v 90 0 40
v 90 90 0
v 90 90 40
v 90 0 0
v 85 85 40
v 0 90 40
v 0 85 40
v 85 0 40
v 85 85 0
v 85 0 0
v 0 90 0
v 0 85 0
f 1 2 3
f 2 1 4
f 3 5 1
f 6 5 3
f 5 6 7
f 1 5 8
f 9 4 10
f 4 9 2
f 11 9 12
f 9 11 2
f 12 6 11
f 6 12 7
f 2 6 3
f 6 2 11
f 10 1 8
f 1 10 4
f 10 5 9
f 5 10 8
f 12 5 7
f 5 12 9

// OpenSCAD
// DIY Magnetic Stirrer Housing
// Based on an 80mm PC case fan
// Print orientation: Upside down (Top plate on bed, walls rising up)
// Centred on Origin (X=0, Y=0)

// --- Dimensions ---
// Outer dimensions
W_OUT = 90;
H_OUT = 90;
// Thicknesses
T_TOP = 2;
T_WALL = 2.5;
// Height of walls (total height from bed to open top)
H_WALL = 40;
// Hole pattern for M4 screws
PATTERN_SIZE = 71.5;
D_HOLE = 4.5;
// Cable notch
NOTCH_W = 12;
NOTCH_H = 8; // Depth from open edge (z = 40 - 8 = 32)

// --- Configuration ---
$fn = 128; // High resolution for smooth curves and precise holes

// --- Construction ---
// We define the geometry in a local coordinate system where the bottom-left corner is (0,0).
// Then we translate the entire assembly to center it on the origin.

difference() {
    // 1. Main Solid Block
    // Dimensions: W_OUT x H_OUT x H_WALL
    cube([W_OUT, H_OUT, H_WALL], center = false);
    
    // 2. Internal Void
    // The empty space inside the box.
    // Width = 90 - 2*2.5 = 85
    // Height = 90 - 2*2.5 = 85
    // Depth = 40 (from z=0 to z=40)
    cube([W_OUT - 2*T_WALL, H_OUT - 2*T_WALL, H_WALL], center = false);
    
    // 3. Screw Holes
    // 4 holes on a 71.5mm square pattern centered on the plate.
    // In local coordinates, the plate is 90x90, centered at (45, 45).
    // Pattern center is (45, 45).
    // Offsets: +/- 71.5/2 = +/- 35.75
    // Z position: Through the top plate (z=0 to z=2).
    // Extend slightly past z=2 to ensure clean cut.
    for (i = [-1, 1]) {
        for (j = [-1, 1]) {
            translate([
                45 + i * (PATTERN_SIZE / 2),
                45 + j * (PATTERN_SIZE / 2),
                0
            ]) 
                cylinder(
                    h = T_TOP + 0.1, // Extend slightly past top plate
                    d = D_HOLE,
                    center = false
                );
        }
    }
    
    // 4. Cable Notch
    // Located in one wall. Let's pick the wall at the negative Y side (front).
    // In local coordinates (0..90):
    // Bottom Y = 0. Top Y = 90.
    // Wall is at the bottom edge (Y=0 to Y=2.5).
    // Center of wall Y = 1.25.
    // Notch is centered along this wall (X=45).
    // Notch cuts INTO the wall from the open top (z=40) downwards.
    
    // Wall Y center in local coords:
    y_wall_center_local = T_WALL / 2;
    
    // Notch geometry relative to local coordinates:
    // X: Centered at 45, width NOTCH_W
    // Y: Centered at y_wall_center_local, width NOTCH_W (cuts through the wall thickness)
    // Z: From (40 - NOTCH_H) to 40
    
    translate([
        45, 
        y_wall_center_local, 
        40 - NOTCH_H
    ])
        cube([NOTCH_W, T_WALL, NOTCH_H], center = false);
}

// Translate the entire assembly to center it on the origin
translate([-W_OUT/2, -H_OUT/2, 0]) {
    // The difference block above is re-executed here? 
    // No, in OpenSCAD, you cannot translate a block that is already inside a difference/union/etc easily without restructuring.
    // The correct approach is to wrap the ENTIRE difference block in a translate.
}

// Corrected Structure: Wrap the whole difference in a translate.
// Since I cannot edit the previous block directly, I will rewrite the file with the correct structure.
